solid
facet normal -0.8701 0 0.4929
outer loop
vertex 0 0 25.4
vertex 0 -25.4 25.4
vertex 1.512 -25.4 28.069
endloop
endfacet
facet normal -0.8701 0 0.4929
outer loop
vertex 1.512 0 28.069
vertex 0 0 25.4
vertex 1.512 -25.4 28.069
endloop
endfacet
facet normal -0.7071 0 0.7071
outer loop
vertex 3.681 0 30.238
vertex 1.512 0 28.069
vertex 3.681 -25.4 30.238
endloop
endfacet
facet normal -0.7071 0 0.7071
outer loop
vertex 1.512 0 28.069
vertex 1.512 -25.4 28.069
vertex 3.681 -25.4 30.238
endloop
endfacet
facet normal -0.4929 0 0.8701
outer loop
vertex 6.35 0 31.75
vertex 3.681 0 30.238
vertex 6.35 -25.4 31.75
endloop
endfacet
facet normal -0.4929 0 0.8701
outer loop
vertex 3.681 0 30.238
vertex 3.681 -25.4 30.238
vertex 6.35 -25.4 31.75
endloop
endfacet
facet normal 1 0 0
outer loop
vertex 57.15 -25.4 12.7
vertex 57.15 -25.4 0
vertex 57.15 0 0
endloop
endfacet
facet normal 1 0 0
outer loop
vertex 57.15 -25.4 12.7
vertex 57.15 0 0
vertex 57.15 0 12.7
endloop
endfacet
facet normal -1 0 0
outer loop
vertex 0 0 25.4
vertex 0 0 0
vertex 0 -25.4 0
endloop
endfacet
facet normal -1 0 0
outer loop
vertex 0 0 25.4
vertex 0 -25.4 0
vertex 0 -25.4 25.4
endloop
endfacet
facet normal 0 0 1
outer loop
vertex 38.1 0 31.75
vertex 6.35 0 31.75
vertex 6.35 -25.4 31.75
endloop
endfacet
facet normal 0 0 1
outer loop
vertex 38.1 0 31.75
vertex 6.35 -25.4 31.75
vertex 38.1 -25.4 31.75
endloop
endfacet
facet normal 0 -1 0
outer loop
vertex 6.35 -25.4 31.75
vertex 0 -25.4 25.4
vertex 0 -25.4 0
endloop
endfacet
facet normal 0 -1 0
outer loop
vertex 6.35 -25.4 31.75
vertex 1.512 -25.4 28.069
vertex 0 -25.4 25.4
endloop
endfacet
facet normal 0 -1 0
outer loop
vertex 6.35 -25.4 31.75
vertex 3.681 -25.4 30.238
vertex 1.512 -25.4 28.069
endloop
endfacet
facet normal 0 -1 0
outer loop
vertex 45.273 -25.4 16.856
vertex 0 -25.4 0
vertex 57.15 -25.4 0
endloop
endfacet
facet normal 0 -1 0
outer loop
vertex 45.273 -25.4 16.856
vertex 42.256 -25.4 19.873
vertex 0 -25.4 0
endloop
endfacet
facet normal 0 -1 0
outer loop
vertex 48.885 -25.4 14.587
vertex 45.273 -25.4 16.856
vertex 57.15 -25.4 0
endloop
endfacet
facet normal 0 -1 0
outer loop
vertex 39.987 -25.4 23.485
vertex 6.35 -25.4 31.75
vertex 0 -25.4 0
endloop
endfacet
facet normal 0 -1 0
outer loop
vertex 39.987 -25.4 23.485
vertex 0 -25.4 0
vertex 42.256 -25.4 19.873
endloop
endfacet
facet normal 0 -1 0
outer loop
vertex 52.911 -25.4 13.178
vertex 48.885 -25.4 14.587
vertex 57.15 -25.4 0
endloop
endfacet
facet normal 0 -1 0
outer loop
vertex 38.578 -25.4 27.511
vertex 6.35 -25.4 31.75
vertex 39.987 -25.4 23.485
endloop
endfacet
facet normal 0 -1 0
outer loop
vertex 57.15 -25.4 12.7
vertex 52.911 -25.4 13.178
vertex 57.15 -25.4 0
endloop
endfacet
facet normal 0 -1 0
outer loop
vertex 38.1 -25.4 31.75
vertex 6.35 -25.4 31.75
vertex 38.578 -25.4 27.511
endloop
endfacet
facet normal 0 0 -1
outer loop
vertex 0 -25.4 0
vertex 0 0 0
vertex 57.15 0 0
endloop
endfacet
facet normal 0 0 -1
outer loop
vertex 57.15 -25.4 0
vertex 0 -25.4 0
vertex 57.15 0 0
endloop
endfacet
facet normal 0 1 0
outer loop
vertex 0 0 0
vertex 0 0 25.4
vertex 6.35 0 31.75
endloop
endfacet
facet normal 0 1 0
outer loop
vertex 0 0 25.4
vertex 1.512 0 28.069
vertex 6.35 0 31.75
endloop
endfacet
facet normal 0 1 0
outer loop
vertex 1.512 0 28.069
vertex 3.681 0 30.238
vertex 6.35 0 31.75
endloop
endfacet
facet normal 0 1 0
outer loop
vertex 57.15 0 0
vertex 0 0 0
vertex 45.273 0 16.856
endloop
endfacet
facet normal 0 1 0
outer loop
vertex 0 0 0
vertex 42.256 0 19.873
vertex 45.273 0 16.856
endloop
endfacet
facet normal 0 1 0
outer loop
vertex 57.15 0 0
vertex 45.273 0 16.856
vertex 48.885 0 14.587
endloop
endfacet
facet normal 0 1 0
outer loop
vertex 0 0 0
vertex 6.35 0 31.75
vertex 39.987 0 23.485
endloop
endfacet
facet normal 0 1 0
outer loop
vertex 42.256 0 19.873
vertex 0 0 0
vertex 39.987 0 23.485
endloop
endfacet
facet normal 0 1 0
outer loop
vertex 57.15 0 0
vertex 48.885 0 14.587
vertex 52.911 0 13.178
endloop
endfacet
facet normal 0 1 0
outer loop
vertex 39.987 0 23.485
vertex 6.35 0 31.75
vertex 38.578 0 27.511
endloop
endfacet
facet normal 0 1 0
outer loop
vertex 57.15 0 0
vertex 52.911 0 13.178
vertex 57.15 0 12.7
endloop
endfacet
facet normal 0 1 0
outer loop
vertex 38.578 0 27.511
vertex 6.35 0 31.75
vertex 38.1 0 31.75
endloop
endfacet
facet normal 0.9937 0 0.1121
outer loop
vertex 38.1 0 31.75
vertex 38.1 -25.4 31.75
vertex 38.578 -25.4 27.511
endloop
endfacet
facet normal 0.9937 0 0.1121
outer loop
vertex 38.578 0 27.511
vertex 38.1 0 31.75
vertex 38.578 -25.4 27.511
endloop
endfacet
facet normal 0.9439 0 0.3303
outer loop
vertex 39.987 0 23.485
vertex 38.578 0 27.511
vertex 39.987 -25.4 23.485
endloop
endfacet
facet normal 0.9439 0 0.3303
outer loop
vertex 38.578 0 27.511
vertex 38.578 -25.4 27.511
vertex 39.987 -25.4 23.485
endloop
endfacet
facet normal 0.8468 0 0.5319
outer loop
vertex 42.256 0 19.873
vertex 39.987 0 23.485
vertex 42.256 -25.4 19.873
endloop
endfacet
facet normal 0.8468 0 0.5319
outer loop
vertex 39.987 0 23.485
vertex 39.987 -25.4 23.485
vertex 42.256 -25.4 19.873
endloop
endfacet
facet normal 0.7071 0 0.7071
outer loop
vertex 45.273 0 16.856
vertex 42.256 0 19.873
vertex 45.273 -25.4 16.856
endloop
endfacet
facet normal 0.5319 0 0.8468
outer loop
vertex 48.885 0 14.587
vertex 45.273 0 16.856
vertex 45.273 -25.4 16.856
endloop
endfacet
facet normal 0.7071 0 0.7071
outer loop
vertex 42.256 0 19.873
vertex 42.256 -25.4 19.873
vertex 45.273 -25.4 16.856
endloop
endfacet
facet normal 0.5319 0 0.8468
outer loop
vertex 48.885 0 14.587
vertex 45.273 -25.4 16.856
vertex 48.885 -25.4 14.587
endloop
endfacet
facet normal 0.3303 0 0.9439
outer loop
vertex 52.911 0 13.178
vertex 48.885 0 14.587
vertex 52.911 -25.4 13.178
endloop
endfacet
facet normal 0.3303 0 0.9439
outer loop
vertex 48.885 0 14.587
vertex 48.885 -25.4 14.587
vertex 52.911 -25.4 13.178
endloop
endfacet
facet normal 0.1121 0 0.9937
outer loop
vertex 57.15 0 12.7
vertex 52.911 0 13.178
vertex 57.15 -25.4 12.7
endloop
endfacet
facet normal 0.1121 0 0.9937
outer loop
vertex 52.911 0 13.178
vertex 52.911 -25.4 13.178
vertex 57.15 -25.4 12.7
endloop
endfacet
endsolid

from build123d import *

# Parameters (mm, degrees)
F0_W     = 57.15
F0_H     = 31.75
F1_DEPTH = 25.4
F3_DEPTH = 25.4


with BuildPart() as f1:
    # F0 (on Front) → F1 (new body)
    with BuildSketch(Plane.XZ):
        with Locations((28.575, 15.875)):
            Rectangle(F0_W, F0_H)
    extrude(amount=F1_DEPTH)

    # F2 (on face) → F3 (cut)
    with BuildSketch(Plane.XZ.offset(25.4)):
        with BuildLine():
            Line((57.15, 31.75), (38.1, 31.75))
            ThreePointArc((38.1, 31.75), (43.6796158184, 18.2796158184), (57.15, 12.7))
            Line((57.15, 12.7), (57.15, 31.75))
        make_face()
        with BuildLine():
            ThreePointArc((0, 25.4), (2.5236444149, 29.2263555851), (6.35, 31.75))
            Line((6.35, 31.75), (0, 31.75))
            Line((0, 31.75), (0, 25.4))
        make_face()
    extrude(amount=-F3_DEPTH, mode=Mode.SUBTRACT)


solid = f1.part
